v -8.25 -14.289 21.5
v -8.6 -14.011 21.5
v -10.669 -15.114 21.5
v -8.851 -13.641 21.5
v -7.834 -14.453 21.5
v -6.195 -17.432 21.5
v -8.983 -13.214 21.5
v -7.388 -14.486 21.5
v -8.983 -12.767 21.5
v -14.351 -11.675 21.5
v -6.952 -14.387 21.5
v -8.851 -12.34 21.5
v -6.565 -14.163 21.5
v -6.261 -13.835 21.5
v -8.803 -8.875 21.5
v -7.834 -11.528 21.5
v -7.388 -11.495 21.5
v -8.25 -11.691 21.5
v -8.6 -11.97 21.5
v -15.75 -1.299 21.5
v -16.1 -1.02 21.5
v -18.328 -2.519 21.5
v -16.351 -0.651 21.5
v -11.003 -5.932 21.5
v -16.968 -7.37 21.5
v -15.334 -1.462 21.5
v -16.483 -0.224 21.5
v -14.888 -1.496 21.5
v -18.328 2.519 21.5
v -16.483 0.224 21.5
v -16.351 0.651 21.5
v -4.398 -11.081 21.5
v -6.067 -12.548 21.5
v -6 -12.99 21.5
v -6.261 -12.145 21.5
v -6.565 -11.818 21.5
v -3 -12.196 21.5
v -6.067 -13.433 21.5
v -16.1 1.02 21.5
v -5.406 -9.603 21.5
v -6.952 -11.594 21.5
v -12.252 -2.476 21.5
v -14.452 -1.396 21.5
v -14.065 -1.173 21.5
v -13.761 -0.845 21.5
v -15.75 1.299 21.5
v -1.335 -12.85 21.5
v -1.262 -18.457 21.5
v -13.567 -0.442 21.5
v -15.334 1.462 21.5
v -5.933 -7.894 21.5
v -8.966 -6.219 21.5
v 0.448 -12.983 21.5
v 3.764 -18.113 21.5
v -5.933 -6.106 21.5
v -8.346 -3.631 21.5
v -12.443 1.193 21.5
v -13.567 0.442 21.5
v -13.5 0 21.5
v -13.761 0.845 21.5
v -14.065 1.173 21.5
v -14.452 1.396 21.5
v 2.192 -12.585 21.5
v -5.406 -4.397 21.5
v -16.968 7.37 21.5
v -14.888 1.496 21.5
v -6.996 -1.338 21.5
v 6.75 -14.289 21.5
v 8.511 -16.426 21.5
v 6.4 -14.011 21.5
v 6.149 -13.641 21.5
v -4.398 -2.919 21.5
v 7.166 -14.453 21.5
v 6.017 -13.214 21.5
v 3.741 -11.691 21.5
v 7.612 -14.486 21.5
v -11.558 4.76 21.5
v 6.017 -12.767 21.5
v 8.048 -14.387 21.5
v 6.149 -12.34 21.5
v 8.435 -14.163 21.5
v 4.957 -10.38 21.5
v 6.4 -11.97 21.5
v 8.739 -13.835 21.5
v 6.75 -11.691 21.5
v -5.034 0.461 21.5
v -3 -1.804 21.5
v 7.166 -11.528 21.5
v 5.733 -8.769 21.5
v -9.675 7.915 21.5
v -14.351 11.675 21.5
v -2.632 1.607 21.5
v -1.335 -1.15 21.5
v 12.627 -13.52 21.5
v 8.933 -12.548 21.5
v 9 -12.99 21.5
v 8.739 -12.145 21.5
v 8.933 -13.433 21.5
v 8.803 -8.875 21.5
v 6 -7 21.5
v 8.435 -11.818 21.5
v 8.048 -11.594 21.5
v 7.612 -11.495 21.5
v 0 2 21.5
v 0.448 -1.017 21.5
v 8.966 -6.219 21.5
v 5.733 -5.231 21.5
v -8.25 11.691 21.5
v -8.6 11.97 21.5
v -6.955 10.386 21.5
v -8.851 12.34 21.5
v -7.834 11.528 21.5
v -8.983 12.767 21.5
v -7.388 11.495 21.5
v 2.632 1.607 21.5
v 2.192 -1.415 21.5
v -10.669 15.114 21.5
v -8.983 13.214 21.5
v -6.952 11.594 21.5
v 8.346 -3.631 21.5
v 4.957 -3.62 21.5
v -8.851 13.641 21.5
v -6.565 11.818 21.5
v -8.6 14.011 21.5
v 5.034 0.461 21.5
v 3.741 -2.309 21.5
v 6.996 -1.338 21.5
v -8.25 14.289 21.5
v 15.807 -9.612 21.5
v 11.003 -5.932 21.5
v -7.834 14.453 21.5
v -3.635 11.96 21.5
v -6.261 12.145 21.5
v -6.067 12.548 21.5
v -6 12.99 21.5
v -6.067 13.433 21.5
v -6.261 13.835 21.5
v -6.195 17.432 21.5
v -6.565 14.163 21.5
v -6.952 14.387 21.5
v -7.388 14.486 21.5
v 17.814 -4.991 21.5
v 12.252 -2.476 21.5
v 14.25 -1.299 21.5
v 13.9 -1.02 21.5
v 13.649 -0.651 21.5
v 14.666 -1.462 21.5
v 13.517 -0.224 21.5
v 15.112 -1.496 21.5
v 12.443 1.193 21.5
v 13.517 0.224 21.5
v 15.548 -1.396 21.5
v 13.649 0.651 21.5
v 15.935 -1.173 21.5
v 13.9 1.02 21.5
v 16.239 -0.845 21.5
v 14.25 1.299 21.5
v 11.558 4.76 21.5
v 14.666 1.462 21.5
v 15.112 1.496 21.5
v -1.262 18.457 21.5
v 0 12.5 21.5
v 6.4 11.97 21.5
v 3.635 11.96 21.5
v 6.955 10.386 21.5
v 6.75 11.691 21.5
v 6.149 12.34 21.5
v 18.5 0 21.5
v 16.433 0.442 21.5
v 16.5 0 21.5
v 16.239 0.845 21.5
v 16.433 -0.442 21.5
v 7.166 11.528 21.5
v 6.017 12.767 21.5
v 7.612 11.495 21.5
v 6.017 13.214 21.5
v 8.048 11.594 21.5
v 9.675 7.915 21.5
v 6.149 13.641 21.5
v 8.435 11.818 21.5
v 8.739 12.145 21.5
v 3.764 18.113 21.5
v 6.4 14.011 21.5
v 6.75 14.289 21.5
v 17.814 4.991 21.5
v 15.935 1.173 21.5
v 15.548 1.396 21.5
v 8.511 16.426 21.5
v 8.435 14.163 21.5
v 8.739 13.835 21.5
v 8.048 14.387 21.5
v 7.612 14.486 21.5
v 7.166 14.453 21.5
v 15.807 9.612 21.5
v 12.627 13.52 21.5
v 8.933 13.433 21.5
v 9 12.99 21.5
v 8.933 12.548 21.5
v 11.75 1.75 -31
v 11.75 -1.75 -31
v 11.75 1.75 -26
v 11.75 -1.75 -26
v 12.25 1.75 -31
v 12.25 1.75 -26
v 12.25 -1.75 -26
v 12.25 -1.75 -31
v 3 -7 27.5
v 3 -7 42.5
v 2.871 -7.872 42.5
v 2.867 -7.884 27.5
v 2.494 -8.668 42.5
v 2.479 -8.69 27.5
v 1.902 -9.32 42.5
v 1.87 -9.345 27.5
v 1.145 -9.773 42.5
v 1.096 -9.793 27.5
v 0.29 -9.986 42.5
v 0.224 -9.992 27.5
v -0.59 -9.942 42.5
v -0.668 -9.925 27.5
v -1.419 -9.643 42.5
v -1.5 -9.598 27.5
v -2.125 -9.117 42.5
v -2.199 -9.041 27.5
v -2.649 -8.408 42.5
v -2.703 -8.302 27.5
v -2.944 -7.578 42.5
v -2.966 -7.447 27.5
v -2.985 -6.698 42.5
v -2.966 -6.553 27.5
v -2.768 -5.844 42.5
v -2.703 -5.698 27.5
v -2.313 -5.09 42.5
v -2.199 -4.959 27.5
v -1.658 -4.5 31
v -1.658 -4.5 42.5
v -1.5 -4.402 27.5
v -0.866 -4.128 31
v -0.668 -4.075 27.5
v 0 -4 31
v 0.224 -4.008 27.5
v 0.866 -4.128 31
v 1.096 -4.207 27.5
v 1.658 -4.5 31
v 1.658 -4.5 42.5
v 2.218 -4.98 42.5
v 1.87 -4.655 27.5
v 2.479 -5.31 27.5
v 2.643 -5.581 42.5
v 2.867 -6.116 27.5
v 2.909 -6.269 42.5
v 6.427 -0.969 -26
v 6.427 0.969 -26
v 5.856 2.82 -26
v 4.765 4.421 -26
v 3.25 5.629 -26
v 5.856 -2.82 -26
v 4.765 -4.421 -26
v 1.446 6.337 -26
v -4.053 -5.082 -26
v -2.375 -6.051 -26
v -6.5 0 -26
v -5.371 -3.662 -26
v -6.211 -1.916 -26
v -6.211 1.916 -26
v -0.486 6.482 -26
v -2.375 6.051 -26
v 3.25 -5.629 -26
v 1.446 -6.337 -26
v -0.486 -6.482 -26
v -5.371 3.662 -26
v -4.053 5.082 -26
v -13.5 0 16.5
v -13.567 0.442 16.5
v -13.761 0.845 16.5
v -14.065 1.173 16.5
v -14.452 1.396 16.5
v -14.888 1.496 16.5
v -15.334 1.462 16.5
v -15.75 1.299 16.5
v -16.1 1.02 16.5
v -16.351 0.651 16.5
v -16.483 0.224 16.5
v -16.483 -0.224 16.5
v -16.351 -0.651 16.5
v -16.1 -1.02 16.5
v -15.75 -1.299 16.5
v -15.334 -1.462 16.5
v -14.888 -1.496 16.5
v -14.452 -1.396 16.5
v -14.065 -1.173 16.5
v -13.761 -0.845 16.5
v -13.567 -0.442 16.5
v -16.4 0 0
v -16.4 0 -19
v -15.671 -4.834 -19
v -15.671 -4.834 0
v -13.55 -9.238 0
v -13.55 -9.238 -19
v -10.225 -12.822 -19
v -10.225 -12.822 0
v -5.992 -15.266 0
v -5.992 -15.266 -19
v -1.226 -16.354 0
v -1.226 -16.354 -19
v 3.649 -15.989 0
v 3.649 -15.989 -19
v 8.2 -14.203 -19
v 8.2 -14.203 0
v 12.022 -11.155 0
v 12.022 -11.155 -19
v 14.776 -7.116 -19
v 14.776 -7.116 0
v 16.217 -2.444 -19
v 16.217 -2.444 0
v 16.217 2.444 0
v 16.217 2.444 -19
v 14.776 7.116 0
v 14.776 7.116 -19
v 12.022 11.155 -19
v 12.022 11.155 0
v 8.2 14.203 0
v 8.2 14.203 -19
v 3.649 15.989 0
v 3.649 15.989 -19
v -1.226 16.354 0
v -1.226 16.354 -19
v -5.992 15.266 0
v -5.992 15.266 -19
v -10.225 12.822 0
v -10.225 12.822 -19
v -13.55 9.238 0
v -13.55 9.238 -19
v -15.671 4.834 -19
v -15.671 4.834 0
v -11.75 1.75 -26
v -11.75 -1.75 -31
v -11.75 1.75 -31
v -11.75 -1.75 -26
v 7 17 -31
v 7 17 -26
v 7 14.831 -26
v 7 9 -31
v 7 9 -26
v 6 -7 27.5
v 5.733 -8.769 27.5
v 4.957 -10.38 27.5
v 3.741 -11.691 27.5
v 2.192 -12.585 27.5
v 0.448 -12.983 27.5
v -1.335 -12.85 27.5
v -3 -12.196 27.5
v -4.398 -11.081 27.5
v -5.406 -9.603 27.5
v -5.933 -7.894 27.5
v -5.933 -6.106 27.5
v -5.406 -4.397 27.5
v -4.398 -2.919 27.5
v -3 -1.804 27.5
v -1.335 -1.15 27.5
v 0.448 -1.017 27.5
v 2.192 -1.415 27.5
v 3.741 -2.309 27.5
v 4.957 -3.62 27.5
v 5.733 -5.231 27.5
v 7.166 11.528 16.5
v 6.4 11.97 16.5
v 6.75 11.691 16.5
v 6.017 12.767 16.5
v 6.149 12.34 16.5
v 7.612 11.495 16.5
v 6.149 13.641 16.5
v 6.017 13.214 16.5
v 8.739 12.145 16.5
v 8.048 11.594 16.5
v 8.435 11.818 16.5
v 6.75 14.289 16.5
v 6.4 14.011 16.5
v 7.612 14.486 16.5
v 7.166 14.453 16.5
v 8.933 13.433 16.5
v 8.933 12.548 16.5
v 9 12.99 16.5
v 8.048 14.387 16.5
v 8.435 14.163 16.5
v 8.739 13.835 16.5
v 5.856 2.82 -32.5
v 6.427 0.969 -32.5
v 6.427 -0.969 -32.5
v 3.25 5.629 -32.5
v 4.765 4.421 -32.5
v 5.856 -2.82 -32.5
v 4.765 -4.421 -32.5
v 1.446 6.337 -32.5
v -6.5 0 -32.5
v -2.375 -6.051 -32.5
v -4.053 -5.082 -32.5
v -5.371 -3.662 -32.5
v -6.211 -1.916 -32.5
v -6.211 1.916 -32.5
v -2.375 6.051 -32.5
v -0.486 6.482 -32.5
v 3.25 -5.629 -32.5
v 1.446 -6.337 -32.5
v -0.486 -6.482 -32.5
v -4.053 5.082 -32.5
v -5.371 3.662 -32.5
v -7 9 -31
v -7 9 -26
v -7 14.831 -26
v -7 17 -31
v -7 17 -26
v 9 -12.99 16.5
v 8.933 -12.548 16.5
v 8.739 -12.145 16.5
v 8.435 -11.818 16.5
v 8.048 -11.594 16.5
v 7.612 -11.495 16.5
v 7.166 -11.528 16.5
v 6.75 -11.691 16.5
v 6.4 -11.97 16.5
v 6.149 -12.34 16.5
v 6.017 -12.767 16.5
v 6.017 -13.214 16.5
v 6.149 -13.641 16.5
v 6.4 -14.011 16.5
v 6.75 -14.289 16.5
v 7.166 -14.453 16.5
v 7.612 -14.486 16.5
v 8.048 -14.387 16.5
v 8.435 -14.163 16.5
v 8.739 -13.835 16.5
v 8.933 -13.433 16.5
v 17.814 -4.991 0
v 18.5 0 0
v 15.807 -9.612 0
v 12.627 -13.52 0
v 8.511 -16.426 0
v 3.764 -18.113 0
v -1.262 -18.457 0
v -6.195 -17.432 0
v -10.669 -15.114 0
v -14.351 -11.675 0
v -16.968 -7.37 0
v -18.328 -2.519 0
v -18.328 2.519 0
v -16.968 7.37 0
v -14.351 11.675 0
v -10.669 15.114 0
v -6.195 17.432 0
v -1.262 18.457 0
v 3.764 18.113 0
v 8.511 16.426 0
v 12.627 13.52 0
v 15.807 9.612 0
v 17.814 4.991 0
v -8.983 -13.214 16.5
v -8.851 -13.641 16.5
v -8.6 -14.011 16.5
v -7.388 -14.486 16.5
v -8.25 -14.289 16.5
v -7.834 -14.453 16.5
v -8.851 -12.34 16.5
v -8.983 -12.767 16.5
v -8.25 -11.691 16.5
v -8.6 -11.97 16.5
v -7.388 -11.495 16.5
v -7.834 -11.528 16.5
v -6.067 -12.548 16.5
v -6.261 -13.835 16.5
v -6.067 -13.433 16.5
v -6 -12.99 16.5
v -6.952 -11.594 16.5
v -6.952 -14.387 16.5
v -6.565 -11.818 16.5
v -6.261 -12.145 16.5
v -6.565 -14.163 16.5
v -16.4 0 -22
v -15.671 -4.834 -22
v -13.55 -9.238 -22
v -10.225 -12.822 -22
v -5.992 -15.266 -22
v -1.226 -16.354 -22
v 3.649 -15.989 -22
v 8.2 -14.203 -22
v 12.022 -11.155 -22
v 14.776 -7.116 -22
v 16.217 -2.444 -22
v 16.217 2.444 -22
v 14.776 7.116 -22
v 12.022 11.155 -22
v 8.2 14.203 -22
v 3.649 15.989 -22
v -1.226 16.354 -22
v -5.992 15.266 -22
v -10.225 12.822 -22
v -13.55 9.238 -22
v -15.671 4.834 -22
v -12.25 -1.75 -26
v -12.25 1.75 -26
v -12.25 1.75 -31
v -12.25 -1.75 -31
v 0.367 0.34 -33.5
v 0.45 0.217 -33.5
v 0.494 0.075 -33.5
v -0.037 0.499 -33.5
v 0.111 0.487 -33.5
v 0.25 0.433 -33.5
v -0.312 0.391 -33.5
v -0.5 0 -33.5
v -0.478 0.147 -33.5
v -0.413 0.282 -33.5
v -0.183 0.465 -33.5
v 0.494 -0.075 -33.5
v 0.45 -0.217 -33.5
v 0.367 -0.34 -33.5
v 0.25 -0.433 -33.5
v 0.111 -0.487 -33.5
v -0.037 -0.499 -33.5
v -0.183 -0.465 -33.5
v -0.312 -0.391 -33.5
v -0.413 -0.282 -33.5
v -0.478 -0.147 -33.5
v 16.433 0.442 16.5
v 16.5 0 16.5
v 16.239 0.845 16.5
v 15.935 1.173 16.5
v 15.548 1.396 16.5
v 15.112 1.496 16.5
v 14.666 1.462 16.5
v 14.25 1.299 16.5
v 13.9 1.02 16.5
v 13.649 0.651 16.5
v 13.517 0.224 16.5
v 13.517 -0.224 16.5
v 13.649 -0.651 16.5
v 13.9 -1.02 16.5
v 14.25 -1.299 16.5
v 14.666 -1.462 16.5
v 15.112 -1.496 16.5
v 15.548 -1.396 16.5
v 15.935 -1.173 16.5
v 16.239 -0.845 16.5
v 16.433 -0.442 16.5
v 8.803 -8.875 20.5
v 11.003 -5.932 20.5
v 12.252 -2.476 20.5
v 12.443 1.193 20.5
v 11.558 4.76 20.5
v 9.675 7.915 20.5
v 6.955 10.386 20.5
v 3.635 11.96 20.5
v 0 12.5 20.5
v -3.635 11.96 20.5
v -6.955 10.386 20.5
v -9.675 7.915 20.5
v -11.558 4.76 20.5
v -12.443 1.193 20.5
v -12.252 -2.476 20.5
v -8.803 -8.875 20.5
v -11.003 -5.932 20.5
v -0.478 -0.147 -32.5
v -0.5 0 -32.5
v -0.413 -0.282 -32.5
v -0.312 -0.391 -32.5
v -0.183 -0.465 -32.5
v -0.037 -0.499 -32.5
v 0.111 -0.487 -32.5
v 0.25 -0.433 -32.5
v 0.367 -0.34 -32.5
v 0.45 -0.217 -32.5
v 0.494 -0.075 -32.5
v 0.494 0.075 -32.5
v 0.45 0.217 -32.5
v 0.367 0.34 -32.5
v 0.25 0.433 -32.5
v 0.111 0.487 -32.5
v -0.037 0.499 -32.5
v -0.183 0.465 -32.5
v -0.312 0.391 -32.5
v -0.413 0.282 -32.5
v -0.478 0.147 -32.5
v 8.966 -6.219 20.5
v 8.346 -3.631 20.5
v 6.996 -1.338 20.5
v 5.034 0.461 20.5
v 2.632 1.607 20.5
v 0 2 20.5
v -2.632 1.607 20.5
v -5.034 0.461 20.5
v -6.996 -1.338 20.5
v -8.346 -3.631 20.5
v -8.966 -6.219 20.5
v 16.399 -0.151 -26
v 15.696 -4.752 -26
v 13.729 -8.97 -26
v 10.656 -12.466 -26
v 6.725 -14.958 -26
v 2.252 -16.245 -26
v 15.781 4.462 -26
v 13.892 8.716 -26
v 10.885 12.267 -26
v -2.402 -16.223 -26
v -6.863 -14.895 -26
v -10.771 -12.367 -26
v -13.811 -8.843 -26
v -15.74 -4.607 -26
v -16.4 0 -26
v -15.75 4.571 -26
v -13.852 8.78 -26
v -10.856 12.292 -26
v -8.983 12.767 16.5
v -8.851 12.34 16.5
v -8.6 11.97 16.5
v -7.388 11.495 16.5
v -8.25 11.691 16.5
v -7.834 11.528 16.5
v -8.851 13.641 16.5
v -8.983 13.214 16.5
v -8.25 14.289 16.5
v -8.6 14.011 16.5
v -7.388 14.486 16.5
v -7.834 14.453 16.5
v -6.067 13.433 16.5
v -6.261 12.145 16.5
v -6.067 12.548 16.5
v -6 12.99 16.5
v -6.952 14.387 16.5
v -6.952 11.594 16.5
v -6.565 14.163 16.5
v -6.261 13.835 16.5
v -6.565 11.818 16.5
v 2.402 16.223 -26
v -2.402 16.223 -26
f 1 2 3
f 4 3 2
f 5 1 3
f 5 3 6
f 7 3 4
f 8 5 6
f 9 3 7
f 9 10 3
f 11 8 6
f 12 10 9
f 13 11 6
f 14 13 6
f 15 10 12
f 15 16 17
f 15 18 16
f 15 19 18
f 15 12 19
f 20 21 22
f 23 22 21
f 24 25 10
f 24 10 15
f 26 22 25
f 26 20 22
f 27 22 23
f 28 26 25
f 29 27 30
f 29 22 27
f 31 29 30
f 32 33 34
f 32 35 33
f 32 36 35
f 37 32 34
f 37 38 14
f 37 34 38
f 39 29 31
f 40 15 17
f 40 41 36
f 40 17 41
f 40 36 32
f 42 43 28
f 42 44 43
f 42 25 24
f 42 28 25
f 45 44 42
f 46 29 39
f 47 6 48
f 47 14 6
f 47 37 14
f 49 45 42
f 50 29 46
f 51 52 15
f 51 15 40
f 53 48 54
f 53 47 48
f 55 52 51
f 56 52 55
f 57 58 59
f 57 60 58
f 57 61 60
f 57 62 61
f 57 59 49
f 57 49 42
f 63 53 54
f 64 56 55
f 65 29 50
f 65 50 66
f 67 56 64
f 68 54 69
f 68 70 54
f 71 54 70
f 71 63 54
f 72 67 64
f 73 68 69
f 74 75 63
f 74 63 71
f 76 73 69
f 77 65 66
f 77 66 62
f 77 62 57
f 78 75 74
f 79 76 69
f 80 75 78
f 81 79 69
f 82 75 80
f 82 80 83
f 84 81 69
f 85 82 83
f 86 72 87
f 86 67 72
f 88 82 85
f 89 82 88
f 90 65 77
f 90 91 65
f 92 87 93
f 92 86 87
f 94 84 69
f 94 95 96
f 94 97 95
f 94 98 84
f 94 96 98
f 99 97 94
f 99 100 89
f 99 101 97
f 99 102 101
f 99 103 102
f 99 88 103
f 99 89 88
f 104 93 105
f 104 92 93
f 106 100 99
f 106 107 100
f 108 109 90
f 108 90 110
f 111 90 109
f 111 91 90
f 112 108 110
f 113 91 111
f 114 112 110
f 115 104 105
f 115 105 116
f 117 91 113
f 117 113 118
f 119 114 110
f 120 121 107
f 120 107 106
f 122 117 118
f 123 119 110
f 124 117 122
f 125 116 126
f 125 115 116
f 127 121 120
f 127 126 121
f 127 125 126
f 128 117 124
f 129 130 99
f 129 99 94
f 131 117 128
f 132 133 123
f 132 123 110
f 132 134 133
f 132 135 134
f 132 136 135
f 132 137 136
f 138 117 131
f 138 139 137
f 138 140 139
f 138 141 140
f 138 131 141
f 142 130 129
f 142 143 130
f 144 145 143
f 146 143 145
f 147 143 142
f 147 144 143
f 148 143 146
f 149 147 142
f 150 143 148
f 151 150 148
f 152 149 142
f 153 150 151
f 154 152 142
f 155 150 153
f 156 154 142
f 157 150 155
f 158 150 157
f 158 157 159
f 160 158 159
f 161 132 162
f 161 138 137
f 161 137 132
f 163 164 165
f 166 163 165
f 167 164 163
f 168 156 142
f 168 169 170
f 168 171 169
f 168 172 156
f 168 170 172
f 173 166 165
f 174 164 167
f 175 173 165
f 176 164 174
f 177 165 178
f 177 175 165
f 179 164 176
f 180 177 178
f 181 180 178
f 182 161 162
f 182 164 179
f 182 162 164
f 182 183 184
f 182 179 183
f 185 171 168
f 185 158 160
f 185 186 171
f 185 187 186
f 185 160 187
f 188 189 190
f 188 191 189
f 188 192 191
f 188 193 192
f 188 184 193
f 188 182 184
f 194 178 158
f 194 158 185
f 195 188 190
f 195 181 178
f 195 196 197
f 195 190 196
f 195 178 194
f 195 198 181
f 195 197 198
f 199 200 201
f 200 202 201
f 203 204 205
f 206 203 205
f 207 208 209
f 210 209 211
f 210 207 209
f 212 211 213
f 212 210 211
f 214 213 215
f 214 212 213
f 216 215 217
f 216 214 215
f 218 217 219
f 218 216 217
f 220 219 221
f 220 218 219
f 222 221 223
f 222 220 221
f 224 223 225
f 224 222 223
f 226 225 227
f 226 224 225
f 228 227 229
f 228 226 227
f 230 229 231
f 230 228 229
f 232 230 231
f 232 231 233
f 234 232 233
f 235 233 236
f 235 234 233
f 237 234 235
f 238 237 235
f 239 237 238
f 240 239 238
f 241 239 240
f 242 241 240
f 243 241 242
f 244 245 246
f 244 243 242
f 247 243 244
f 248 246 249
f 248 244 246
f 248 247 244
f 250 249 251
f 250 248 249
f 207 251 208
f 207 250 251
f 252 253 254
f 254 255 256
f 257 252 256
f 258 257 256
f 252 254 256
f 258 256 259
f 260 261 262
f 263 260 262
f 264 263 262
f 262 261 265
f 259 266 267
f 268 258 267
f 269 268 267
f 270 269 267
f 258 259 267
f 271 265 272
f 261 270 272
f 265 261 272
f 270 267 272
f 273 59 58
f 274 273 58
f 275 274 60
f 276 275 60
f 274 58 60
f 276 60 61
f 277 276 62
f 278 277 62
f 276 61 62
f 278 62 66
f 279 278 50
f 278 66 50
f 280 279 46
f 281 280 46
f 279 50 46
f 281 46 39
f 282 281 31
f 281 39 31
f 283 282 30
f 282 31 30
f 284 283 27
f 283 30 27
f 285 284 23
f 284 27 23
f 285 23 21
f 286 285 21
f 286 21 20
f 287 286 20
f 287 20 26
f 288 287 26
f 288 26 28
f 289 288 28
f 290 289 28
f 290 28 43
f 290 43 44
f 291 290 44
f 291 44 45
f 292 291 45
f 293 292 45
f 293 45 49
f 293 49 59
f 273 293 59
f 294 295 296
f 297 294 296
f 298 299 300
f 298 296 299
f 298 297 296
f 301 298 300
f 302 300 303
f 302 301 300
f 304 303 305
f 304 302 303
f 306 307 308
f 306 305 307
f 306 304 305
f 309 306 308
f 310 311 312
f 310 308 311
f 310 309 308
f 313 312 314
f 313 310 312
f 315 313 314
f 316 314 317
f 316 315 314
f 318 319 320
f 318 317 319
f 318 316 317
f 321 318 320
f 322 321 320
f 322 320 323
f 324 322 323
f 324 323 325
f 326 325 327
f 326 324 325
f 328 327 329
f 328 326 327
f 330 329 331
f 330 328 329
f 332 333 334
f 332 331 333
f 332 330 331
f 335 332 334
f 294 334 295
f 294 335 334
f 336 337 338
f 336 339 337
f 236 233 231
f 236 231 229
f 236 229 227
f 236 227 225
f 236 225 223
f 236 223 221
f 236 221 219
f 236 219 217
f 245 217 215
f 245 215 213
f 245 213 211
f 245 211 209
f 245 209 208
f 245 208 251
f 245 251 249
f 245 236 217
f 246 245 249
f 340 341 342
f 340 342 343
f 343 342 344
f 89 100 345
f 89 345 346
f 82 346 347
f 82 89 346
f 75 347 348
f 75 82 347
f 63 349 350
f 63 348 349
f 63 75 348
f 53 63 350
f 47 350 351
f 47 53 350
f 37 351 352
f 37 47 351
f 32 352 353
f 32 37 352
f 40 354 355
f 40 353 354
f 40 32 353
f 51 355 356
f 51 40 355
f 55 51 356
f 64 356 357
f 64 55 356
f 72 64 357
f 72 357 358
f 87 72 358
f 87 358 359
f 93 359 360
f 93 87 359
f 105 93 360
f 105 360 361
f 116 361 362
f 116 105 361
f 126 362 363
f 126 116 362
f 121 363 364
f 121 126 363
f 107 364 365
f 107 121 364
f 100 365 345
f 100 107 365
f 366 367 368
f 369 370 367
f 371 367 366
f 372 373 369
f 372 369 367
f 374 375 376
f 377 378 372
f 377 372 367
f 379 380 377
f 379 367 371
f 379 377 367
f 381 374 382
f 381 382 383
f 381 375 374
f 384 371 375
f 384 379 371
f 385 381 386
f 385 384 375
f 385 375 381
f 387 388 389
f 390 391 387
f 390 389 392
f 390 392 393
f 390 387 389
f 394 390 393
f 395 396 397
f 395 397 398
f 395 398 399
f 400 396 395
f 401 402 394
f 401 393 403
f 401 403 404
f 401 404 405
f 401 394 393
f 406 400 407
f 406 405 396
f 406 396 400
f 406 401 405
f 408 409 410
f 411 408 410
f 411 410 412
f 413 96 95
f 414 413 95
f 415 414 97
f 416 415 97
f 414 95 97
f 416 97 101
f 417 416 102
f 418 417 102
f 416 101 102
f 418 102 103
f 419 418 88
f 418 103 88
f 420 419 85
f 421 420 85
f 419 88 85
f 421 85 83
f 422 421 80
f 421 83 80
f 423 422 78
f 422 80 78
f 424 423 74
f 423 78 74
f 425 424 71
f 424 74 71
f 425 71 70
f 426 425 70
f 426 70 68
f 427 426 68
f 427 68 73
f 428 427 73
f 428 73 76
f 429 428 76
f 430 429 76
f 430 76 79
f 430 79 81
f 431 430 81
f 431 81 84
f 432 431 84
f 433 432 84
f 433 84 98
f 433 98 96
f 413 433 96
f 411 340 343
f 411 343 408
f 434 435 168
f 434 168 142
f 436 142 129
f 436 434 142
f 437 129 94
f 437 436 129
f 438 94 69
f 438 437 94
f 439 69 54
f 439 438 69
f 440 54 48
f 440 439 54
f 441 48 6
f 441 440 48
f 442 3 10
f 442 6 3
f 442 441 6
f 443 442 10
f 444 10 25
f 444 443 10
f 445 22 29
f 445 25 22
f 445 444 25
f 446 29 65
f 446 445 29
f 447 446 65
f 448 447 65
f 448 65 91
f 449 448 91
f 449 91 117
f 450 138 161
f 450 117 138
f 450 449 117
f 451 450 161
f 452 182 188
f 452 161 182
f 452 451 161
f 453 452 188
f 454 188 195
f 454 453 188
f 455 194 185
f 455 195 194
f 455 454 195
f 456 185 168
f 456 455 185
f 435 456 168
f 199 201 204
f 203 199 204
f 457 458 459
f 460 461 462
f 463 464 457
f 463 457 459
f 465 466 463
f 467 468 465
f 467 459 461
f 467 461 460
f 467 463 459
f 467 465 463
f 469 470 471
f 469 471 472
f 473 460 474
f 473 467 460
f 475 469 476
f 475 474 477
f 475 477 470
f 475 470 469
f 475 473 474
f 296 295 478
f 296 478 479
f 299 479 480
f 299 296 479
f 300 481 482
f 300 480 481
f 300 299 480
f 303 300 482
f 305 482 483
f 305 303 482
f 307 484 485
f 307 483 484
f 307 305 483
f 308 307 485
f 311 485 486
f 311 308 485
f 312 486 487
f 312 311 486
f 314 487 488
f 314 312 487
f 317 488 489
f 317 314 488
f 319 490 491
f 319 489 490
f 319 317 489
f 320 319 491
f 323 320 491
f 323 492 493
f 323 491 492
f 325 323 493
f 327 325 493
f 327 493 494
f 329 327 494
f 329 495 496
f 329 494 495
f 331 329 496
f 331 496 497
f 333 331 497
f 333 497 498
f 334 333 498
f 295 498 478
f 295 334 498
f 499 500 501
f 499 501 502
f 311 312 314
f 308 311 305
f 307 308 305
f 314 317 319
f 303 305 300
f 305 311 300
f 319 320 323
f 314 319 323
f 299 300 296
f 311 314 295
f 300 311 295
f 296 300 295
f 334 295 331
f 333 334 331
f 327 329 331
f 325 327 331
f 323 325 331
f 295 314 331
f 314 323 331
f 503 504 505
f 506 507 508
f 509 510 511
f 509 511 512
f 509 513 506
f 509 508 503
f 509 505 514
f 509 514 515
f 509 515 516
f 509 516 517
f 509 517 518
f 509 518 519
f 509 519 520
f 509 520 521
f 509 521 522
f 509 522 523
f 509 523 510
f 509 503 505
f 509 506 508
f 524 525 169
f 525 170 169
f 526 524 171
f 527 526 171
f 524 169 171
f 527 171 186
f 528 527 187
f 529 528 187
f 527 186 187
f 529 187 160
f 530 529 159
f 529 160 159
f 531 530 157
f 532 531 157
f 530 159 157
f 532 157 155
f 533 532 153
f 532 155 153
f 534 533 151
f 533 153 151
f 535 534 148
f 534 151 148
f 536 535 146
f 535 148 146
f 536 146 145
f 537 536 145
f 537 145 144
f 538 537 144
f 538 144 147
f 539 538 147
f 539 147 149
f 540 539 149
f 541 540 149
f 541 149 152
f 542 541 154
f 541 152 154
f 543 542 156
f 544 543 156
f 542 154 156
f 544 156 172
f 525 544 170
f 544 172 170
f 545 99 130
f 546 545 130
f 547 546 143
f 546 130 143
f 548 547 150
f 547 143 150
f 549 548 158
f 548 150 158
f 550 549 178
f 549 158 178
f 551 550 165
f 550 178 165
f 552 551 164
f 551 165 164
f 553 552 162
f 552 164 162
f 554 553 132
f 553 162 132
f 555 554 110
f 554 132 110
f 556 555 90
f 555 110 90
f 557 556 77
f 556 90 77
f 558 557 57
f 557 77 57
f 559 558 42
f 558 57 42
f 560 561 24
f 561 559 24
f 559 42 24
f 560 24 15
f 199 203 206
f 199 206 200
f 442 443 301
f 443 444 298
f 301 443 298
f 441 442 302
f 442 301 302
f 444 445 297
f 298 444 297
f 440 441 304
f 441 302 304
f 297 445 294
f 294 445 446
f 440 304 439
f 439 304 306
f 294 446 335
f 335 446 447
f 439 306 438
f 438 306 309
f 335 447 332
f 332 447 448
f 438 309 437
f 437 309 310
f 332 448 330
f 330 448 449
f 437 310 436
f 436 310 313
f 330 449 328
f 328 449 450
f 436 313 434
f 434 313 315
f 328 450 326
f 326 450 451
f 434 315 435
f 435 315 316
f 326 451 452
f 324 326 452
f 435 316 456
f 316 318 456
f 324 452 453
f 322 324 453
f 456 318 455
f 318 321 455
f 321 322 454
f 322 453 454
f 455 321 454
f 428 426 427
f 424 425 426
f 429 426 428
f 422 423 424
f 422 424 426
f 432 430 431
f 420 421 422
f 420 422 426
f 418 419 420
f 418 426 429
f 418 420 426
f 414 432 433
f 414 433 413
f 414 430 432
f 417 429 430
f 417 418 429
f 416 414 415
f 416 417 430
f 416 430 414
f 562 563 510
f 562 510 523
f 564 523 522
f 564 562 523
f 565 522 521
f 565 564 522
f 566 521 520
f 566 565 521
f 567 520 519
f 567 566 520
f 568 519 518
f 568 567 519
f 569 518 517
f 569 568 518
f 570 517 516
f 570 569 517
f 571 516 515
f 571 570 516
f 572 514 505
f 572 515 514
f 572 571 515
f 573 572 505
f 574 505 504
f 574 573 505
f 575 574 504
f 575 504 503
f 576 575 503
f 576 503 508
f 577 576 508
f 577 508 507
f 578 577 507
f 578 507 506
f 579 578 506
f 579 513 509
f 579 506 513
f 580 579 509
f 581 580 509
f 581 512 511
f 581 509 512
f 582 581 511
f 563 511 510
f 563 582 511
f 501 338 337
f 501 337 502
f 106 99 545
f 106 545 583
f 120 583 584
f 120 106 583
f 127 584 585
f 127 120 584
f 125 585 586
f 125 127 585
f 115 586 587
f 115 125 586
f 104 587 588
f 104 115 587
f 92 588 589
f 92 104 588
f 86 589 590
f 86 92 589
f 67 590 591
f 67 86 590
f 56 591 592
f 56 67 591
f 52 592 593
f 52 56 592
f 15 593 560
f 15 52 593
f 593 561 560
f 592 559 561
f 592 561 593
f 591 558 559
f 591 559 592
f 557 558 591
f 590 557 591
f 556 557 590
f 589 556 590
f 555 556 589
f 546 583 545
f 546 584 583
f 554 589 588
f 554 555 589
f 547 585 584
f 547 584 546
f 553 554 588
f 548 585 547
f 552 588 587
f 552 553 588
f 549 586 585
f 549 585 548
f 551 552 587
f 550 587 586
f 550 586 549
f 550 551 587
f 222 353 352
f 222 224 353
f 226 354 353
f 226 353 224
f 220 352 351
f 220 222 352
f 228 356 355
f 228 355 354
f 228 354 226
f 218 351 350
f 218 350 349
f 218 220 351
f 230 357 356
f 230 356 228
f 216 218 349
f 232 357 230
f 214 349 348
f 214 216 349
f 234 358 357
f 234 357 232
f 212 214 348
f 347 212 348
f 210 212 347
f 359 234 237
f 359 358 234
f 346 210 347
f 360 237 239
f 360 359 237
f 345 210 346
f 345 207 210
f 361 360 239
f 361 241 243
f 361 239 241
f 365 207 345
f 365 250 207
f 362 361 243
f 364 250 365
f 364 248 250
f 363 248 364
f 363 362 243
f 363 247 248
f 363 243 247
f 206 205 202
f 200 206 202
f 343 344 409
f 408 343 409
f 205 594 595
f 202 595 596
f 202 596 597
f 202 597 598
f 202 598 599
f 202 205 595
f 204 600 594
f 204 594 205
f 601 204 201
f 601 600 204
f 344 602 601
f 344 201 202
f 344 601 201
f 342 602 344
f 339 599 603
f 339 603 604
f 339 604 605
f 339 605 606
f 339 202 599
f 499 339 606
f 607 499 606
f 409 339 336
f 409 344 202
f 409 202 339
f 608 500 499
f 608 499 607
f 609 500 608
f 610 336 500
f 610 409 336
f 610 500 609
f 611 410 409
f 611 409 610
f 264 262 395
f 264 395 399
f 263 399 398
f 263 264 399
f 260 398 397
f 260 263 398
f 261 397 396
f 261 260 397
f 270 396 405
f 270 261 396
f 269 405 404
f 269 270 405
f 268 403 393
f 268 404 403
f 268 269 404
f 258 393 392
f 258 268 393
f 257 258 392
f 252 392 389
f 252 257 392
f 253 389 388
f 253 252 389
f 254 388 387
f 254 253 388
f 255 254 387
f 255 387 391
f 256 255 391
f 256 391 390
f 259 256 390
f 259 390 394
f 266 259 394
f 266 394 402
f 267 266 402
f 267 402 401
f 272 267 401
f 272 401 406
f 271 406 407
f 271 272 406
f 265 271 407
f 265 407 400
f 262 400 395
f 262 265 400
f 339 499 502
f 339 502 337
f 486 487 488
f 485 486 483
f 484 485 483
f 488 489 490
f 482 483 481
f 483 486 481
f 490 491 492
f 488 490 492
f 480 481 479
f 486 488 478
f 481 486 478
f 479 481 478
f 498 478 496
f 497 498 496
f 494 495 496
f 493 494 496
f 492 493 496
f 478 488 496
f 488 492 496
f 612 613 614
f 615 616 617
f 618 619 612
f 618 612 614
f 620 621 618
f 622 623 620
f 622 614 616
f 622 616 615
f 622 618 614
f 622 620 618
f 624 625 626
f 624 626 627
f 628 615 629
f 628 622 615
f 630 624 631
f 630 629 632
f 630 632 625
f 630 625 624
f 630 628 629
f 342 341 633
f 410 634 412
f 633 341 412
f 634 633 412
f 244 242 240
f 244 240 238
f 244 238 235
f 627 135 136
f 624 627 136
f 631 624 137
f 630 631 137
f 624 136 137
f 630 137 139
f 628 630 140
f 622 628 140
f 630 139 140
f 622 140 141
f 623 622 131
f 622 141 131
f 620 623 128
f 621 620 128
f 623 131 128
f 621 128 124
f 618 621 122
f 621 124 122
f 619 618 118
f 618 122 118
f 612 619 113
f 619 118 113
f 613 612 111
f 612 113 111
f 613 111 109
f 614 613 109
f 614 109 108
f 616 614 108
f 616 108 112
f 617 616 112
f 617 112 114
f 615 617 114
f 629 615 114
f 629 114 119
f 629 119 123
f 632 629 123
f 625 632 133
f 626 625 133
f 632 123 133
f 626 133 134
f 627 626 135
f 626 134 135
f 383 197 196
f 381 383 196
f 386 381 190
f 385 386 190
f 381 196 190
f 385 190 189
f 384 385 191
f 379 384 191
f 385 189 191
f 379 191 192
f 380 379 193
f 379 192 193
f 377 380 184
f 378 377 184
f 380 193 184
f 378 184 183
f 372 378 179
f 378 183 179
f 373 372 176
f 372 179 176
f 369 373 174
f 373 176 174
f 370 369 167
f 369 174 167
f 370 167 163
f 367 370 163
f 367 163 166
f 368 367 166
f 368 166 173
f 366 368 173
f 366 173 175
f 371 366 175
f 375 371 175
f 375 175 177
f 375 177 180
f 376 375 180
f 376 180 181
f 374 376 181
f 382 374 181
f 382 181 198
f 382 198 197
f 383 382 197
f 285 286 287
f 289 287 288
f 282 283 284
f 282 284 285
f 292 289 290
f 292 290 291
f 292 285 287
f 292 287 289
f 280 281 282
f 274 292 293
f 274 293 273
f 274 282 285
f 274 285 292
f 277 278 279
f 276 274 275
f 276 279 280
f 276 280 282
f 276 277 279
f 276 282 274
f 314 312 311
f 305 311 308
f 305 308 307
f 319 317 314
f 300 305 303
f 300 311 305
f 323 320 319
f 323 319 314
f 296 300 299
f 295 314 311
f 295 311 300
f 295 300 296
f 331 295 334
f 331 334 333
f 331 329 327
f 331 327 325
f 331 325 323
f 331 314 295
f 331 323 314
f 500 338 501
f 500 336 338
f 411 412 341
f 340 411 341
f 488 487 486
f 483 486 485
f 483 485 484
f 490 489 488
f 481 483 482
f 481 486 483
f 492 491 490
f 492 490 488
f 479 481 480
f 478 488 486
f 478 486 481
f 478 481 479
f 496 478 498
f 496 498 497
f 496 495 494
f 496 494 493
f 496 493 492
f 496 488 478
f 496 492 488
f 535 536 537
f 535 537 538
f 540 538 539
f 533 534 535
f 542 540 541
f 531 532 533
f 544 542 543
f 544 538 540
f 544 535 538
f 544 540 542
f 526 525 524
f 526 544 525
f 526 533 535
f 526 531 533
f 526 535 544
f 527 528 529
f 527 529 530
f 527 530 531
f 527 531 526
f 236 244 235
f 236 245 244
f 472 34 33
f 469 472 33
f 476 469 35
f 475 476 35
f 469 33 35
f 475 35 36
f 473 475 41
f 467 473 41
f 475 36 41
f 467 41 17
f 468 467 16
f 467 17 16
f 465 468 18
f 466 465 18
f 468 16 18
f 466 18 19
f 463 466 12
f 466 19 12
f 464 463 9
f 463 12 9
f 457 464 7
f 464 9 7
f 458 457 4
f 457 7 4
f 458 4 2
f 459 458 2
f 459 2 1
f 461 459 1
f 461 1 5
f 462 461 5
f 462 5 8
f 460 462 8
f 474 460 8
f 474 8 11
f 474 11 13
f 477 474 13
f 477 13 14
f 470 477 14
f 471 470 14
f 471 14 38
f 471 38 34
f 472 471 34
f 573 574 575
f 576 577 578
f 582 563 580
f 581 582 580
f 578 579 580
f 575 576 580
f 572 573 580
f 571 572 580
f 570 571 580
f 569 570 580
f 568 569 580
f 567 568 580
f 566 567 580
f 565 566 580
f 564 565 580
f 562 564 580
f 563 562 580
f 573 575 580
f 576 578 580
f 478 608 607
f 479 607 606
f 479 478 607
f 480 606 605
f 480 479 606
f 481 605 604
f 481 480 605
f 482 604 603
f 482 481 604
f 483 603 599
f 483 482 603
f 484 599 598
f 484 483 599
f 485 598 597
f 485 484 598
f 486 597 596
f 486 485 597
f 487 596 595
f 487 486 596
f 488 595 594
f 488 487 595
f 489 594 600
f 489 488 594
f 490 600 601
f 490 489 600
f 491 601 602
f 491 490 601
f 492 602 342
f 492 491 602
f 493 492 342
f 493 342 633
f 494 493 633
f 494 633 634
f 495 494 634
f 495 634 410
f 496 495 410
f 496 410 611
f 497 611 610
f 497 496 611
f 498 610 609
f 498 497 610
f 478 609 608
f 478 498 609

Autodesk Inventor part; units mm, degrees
ref_plane "YZ Plane" through (0, 0, 0) normal (1, 0, 0) x (0, 1, 0)
ref_plane "XZ Plane" through (0, 0, 0) normal (0, 1, 0) x (-1, 0, 0)
ref_plane "XY Plane" through (0, 0, 0) normal (0, 0, 1) x (1, 0, 0)
sketch "Sketch1" plane through (0, 0, 0) normal (0, 0, 1) x (1, 0, 0)
  circle A0 centre (0, 0) radius 18.5
  dimension "d0" = 37
extrude "Extrusion1" add sketch "Sketch1" along normal blind 21.5
sketch "Sketch2" plane through (0, 0, 0) normal (0, 0, -1) x (-1, 0, 0)
  circle A0 centre (0, 0) radius 16.4
  dimension "d3" = 32.8
extrude "Extrusion2" add sketch "Sketch2" along normal blind 19
sketch "Sketch3" plane through (0, 0, 21.5) normal (0, 0, 1) x (1, 0, 0)
  circle A0 centre (0, -7) radius 6
  point P0 (0, 0)
  dimension "d6" = 12
extrude "Extrusion3" add sketch "Sketch3" along normal blind 6
sketch "Sketch4" plane through (0, -7, 27.5) normal (0, 0, 1) x (1, 0, 0)
  circle A0 centre (0, 0) radius 6 projected
  circle A1 centre (0, 0) radius 3
  point P0 (0, 7)
  dimension "d9" = 6
extrude "Extrusion4" add sketch "Sketch4" along normal blind 15 contours A1
sketch "Sketch5" plane through (0, -7, 42.5) normal (0, 0, 1) x (1, 0, 0)
  line L0 (0, 2.5) -> (1.6583, 2.5)
  line L1 (1.6583, 2.5) -> (-1.6583, 2.5)
  circle A0 centre (0, 0) radius 3 projected
  point P0 (0, 7)
extrude "Extrusion5" cut sketch "Sketch5" against normal blind 11.5 contours L1 A0 L0 picked at (-0.897, 2.6056)
sketch "Sketch6" plane through (0, 0, 21.5) normal (0, 0, 1) x (1, 0, 0)
  circle A0 centre (0, 0) radius 15 construction
  circle A1 centre (15, 0) radius 1.5
  circle A2 centre (7.5, 12.9904) radius 1.5
  circle A3 centre (-7.5, 12.9904) radius 1.5
  circle A4 centre (-15, 0) radius 1.5
  circle A5 centre (-7.5, -12.9904) radius 1.5
  circle A6 centre (7.5, -12.9904) radius 1.5
  dimension "d14" = 30
  dimension "d15" = 3
  dimension "d18" = 360
extrude "Extrusion6" cut sketch "Sketch6" against normal blind 5
sketch "Sketch7" plane through (0, 0, -19) normal (0, 0, -1) x (-1, 0, 0)
  circle A0 centre (0, 0) radius 16.4
extrude "Extrusion7" add sketch "Sketch7" along normal blind 3 separate body
sketch "Sketch8" plane through (0, 0, -22) normal (0, 0, -1) x (-1, 0, 0)
  circle A0 centre (0, 0) radius 16.4
extrude "Extrusion8" add sketch "Sketch8" along normal blind 4 separate body
sketch "Sketch9" plane through (0, 0, -26) normal (0, 0, -1) x (-1, 0, 0)
  circle A0 centre (0, 0) radius 6.5
  dimension "d26" = 13
extrude "Extrusion9" add sketch "Sketch9" along normal blind 6.5 separate body
sketch "Sketch10" plane through (0, 0, -32.5) normal (0, 0, -1) x (-1, 0, 0)
  circle A0 centre (0, 0) radius 0.5
  dimension "d29" = 1
extrude "Extrusion10" add sketch "Sketch10" along normal blind 1 separate body
sketch "Sketch11" plane through (0, 0, 21.5) normal (0, 0, 1) x (1, 0, 0)
  circle A0 centre (0, 0) radius 0.5 projected
  circle A1 centre (0, 0) radius 12.5
  circle A2 centre (0, -7) radius 6 projected
  circle A3 centre (0, -7) radius 9
  point P0 (-8.8025, -8.875)
  point P1 (8.8025, -8.875)
  dimension "d32" = 25
  dimension "d33" = 18
extrude "Extrusion11" cut sketch "Sketch11" against normal blind 1 contours A1 A3 bodies 1
sketch "Sketch12" plane through (0, 0, -26) normal (0, 0, -1) x (-1, 0, 0)
  line L0 (0, 9) -> (14.8265, 9) construction
  line L1 (14.8265, 9) -> (-13.5735, 9) construction
  line L2 (0, 9) -> (7, 9)
  line L3 (7, 9) -> (7, 17)
  line L4 (7, 17) -> (0, 17)
  line L5 (0, 17) -> (0, 9)
  line L6 (0, 17) -> (-7, 17)
  line L7 (-7, 17) -> (-7, 9)
  line L8 (-7, 9) -> (0, 9)
  line L9 (0, 9) -> (0, 17)
  point P0 (0, 0)
  dimension "d36" = 7
  dimension "d37" = 8
  dimension "d38" = 7
extrude "Extrusion12" add sketch "Sketch12" along normal blind 5 bodies 3
sketch "Sketch13" plane through (0, 0, -26) normal (0, 0, -1) x (-1, 0, 0)
  circle A0 centre (0, 0) radius 0.5 projected
  line L0 (0, 0) -> (11.75, 0)
  line L1 (11.75, 0) -> (11.75, 1.75)
  line L2 (11.75, 1.75) -> (12.25, 1.75)
  line L3 (12.25, 1.75) -> (12.25, -1.75)
  line L4 (12.25, -1.75) -> (11.75, -1.75)
  line L5 (11.75, -1.75) -> (11.75, 1.75)
  line L6 (0, 0) -> (0, 8.55) construction
  line L7 (0, 0) -> (-11.75, 0)
  line L8 (-11.75, 0) -> (-11.75, 1.75)
  line L9 (-11.75, 1.75) -> (-12.25, 1.75)
  line L10 (-12.25, 1.75) -> (-12.25, -1.75)
  line L11 (-12.25, -1.75) -> (-11.75, -1.75)
  line L12 (-11.75, -1.75) -> (-11.75, 1.75)
  dimension "d41" = 11.75
  dimension "d42" = 1.75
  dimension "d43" = 0.5
  dimension "d44" = 3.5
extrude "Extrusion13" add sketch "Sketch13" along normal blind 5 contours L12 L11 L10 L9 L8 | L1 L2 L3 L4 L5 bodies 3
properties part number "520 DC Gear Motor"
